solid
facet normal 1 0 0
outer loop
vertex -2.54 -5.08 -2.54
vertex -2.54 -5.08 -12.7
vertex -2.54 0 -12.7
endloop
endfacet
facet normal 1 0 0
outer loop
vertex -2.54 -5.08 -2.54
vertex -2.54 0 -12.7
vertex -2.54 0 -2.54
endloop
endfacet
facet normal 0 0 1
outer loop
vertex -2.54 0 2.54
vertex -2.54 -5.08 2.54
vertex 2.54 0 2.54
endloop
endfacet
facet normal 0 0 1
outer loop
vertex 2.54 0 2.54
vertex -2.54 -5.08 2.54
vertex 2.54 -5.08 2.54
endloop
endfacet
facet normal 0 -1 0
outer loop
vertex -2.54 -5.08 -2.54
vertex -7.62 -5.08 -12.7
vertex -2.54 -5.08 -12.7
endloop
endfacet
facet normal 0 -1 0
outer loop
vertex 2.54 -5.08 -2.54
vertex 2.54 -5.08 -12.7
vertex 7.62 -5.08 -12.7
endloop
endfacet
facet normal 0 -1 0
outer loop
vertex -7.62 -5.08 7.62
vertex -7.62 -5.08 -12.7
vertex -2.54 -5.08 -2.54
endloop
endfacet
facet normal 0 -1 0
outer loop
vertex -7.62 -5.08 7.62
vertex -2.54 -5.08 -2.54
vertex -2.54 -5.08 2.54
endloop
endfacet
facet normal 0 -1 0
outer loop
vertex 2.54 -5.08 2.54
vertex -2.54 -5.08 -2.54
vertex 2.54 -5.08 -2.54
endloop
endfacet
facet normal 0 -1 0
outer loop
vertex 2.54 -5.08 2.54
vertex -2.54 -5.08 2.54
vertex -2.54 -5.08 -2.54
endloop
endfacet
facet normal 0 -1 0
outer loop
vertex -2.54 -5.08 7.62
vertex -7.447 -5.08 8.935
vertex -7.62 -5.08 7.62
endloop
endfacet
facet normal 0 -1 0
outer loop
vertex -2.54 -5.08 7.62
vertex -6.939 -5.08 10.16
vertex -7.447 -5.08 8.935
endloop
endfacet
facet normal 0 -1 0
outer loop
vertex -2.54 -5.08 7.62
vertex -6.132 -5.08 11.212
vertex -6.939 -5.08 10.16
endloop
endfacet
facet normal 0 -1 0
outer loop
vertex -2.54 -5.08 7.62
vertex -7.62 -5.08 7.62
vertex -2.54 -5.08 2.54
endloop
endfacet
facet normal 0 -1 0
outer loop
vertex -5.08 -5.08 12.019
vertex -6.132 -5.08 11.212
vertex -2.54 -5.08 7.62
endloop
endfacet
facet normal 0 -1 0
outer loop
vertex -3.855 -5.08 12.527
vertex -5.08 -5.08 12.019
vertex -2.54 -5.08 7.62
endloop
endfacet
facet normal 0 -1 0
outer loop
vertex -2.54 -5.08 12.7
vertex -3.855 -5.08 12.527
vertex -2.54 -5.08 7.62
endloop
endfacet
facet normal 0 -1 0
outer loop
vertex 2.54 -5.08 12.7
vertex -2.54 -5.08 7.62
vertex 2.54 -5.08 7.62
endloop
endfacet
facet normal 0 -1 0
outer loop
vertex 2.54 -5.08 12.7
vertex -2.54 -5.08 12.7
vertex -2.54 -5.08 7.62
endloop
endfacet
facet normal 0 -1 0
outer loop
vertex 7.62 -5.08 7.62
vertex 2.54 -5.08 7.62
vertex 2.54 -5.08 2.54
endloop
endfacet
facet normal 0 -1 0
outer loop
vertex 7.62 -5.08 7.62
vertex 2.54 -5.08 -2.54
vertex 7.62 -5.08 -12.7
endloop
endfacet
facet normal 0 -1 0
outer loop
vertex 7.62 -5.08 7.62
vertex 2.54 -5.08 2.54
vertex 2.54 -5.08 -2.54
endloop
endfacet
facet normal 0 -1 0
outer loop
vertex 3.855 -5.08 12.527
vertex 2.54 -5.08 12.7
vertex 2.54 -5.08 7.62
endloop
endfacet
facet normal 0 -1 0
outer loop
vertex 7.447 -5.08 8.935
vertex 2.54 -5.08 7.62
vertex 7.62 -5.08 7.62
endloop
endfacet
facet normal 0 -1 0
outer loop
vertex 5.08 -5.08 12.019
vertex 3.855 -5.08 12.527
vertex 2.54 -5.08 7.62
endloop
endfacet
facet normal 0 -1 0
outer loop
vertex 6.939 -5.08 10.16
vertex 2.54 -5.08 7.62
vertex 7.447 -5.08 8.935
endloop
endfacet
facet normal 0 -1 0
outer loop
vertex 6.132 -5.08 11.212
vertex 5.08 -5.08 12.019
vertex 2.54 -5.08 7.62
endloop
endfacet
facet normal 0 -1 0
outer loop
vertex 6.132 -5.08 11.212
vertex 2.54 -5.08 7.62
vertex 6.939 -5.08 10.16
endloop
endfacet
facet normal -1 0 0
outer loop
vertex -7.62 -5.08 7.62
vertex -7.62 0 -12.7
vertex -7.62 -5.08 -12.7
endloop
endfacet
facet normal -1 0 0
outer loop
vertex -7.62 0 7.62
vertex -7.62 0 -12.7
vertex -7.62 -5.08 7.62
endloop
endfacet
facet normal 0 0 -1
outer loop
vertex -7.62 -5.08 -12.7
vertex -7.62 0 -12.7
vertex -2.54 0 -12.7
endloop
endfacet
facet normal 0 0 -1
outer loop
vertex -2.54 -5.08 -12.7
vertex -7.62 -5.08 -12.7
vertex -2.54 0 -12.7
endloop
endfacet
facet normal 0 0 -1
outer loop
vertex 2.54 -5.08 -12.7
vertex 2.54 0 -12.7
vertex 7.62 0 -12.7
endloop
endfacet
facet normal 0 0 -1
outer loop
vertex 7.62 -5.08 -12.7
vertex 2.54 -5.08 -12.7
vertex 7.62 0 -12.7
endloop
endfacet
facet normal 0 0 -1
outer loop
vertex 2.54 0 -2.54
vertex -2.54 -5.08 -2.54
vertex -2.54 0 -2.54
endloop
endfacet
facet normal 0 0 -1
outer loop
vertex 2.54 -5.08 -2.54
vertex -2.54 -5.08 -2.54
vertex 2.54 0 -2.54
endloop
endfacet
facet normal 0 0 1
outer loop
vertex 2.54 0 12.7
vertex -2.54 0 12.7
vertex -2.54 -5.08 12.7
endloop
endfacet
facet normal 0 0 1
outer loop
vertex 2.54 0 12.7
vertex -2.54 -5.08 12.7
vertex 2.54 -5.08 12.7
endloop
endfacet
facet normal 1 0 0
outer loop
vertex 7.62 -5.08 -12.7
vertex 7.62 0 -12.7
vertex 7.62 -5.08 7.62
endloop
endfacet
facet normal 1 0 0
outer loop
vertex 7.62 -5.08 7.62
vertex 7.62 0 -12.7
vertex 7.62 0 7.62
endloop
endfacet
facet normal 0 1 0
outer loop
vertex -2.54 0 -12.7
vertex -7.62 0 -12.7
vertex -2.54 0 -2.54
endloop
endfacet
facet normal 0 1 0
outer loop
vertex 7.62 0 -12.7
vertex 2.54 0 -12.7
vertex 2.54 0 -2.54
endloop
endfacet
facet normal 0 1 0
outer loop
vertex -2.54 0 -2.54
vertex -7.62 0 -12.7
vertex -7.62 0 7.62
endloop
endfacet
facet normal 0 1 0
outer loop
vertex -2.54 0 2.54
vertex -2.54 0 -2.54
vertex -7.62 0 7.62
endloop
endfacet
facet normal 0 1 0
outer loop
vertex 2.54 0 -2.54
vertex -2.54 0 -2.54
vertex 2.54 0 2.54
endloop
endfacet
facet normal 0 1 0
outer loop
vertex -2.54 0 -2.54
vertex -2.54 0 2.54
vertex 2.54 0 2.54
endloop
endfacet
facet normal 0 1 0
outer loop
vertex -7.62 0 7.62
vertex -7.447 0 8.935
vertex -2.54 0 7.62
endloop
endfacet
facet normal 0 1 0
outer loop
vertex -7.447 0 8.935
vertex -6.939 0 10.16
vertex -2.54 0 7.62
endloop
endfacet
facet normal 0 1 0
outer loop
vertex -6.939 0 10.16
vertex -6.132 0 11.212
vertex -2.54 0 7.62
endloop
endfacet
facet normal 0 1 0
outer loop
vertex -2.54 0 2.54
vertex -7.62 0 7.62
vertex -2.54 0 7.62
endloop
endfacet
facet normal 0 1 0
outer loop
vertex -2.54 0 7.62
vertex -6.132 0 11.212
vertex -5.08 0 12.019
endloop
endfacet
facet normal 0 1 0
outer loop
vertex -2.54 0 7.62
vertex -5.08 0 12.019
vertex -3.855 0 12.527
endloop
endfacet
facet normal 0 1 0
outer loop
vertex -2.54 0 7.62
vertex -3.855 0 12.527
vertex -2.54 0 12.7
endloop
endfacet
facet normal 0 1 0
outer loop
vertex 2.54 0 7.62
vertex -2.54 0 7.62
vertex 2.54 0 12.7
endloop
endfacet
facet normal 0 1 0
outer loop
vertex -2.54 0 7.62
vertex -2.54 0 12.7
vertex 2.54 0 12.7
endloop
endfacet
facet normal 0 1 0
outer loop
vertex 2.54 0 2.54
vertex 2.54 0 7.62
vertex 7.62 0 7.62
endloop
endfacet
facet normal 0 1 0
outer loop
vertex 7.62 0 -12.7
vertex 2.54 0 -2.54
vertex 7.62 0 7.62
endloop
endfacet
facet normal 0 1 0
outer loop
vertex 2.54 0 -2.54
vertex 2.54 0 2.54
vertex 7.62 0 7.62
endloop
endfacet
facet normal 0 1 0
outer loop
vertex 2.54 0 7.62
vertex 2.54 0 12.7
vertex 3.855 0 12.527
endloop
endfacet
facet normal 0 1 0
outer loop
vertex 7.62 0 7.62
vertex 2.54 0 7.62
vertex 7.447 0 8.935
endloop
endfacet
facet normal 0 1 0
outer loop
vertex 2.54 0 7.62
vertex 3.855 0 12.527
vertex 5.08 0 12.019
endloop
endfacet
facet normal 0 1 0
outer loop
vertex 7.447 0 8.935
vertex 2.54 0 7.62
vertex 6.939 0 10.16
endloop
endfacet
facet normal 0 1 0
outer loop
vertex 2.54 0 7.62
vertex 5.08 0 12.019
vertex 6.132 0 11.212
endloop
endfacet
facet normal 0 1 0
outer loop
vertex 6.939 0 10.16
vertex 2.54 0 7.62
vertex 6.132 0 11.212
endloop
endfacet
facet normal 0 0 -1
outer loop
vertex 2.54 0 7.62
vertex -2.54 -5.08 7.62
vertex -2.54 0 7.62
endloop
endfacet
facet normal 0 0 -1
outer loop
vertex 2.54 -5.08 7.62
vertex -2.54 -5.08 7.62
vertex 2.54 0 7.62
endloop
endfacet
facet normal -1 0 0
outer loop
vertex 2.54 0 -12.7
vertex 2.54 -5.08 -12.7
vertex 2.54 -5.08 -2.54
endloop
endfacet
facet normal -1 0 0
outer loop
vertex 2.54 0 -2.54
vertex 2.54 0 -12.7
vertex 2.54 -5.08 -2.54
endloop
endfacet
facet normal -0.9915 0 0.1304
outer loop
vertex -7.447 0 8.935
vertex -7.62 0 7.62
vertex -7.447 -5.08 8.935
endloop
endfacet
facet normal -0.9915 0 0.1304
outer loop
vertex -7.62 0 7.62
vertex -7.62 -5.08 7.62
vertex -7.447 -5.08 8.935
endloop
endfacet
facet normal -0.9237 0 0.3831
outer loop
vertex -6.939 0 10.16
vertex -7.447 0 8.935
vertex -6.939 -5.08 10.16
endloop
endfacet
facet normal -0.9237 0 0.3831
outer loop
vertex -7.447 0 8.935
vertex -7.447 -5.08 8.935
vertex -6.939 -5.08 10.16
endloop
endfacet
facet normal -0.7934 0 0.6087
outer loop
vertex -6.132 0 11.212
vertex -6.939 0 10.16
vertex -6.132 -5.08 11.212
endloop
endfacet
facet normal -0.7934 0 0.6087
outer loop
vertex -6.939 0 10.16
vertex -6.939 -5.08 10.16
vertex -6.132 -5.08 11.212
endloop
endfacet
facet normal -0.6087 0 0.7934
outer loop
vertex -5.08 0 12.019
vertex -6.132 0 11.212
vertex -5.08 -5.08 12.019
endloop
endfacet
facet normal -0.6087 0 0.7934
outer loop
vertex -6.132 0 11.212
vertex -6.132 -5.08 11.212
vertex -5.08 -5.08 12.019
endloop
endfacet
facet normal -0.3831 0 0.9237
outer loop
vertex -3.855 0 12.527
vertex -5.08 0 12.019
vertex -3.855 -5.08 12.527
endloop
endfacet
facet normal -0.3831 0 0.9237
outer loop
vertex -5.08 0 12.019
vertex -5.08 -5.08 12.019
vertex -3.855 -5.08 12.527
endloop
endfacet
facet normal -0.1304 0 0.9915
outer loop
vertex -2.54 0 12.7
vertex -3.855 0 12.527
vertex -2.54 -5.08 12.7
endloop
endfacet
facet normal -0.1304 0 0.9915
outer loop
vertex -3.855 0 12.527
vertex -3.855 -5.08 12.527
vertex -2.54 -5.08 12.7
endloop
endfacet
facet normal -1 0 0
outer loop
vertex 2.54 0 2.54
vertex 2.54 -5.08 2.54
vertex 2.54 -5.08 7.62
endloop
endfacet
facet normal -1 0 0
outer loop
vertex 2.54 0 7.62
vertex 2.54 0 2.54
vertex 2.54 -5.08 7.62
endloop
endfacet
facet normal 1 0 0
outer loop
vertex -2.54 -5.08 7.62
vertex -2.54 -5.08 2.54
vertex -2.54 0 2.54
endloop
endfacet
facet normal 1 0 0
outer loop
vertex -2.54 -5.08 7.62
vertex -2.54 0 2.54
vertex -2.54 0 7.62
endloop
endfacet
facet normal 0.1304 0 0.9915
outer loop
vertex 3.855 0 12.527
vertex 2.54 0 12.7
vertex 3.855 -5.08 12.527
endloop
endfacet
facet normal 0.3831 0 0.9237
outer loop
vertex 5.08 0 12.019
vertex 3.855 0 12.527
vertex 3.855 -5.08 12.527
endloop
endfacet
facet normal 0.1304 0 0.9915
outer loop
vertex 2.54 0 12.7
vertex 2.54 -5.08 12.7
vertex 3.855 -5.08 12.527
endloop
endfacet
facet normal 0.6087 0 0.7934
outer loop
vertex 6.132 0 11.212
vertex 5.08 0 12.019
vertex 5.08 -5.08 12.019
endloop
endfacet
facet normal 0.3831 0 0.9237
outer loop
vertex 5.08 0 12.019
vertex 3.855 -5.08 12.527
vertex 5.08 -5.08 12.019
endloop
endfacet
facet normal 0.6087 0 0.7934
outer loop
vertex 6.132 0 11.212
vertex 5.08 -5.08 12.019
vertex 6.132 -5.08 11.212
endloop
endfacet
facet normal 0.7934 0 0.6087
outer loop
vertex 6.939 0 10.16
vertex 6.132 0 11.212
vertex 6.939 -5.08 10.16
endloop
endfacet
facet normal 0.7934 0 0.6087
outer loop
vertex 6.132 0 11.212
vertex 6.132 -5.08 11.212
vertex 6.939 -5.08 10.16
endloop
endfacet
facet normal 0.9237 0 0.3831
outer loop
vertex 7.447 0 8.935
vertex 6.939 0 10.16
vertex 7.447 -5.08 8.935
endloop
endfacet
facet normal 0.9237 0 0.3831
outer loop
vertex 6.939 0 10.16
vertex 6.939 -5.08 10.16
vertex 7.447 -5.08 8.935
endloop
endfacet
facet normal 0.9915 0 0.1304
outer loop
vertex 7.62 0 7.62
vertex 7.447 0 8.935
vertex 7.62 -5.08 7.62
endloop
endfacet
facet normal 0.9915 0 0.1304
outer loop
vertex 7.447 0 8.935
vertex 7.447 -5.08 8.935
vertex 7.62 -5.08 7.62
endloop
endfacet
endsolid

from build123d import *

# Parameters (mm, degrees)
F0_W     = 15.24
F0_H     = 25.4
F1_DEPTH = 5.08
F2_W     = 5.08
F2_H     = 5.08
F2_H_2   = 10.16
F3_DEPTH = 5.08
F4_R     = 5.08


with BuildPart() as f1:
    # F0 (on Front) → F1 (new body)
    with BuildSketch(Plane.XZ):
        Rectangle(F0_W, F0_H)
    extrude(amount=F1_DEPTH)

    # F2 (on face) → F3 (cut)
    with BuildSketch(Plane.XZ.offset(5.08)):
        with Locations((0, 5.08)):
            Rectangle(F2_W, F2_H)
        with Locations((0, -7.62)):
            Rectangle(F2_W, F2_H_2)
    extrude(amount=-F3_DEPTH, mode=Mode.SUBTRACT)

    # F4
    f4_edges = [f1.edges().sort_by_distance(p)[0] for p in [
        (-7.62, -2.54, 12.7),
        (7.62, -2.54, 12.7),
    ]]
    fillet(f4_edges, radius=F4_R)


solid = f1.part
